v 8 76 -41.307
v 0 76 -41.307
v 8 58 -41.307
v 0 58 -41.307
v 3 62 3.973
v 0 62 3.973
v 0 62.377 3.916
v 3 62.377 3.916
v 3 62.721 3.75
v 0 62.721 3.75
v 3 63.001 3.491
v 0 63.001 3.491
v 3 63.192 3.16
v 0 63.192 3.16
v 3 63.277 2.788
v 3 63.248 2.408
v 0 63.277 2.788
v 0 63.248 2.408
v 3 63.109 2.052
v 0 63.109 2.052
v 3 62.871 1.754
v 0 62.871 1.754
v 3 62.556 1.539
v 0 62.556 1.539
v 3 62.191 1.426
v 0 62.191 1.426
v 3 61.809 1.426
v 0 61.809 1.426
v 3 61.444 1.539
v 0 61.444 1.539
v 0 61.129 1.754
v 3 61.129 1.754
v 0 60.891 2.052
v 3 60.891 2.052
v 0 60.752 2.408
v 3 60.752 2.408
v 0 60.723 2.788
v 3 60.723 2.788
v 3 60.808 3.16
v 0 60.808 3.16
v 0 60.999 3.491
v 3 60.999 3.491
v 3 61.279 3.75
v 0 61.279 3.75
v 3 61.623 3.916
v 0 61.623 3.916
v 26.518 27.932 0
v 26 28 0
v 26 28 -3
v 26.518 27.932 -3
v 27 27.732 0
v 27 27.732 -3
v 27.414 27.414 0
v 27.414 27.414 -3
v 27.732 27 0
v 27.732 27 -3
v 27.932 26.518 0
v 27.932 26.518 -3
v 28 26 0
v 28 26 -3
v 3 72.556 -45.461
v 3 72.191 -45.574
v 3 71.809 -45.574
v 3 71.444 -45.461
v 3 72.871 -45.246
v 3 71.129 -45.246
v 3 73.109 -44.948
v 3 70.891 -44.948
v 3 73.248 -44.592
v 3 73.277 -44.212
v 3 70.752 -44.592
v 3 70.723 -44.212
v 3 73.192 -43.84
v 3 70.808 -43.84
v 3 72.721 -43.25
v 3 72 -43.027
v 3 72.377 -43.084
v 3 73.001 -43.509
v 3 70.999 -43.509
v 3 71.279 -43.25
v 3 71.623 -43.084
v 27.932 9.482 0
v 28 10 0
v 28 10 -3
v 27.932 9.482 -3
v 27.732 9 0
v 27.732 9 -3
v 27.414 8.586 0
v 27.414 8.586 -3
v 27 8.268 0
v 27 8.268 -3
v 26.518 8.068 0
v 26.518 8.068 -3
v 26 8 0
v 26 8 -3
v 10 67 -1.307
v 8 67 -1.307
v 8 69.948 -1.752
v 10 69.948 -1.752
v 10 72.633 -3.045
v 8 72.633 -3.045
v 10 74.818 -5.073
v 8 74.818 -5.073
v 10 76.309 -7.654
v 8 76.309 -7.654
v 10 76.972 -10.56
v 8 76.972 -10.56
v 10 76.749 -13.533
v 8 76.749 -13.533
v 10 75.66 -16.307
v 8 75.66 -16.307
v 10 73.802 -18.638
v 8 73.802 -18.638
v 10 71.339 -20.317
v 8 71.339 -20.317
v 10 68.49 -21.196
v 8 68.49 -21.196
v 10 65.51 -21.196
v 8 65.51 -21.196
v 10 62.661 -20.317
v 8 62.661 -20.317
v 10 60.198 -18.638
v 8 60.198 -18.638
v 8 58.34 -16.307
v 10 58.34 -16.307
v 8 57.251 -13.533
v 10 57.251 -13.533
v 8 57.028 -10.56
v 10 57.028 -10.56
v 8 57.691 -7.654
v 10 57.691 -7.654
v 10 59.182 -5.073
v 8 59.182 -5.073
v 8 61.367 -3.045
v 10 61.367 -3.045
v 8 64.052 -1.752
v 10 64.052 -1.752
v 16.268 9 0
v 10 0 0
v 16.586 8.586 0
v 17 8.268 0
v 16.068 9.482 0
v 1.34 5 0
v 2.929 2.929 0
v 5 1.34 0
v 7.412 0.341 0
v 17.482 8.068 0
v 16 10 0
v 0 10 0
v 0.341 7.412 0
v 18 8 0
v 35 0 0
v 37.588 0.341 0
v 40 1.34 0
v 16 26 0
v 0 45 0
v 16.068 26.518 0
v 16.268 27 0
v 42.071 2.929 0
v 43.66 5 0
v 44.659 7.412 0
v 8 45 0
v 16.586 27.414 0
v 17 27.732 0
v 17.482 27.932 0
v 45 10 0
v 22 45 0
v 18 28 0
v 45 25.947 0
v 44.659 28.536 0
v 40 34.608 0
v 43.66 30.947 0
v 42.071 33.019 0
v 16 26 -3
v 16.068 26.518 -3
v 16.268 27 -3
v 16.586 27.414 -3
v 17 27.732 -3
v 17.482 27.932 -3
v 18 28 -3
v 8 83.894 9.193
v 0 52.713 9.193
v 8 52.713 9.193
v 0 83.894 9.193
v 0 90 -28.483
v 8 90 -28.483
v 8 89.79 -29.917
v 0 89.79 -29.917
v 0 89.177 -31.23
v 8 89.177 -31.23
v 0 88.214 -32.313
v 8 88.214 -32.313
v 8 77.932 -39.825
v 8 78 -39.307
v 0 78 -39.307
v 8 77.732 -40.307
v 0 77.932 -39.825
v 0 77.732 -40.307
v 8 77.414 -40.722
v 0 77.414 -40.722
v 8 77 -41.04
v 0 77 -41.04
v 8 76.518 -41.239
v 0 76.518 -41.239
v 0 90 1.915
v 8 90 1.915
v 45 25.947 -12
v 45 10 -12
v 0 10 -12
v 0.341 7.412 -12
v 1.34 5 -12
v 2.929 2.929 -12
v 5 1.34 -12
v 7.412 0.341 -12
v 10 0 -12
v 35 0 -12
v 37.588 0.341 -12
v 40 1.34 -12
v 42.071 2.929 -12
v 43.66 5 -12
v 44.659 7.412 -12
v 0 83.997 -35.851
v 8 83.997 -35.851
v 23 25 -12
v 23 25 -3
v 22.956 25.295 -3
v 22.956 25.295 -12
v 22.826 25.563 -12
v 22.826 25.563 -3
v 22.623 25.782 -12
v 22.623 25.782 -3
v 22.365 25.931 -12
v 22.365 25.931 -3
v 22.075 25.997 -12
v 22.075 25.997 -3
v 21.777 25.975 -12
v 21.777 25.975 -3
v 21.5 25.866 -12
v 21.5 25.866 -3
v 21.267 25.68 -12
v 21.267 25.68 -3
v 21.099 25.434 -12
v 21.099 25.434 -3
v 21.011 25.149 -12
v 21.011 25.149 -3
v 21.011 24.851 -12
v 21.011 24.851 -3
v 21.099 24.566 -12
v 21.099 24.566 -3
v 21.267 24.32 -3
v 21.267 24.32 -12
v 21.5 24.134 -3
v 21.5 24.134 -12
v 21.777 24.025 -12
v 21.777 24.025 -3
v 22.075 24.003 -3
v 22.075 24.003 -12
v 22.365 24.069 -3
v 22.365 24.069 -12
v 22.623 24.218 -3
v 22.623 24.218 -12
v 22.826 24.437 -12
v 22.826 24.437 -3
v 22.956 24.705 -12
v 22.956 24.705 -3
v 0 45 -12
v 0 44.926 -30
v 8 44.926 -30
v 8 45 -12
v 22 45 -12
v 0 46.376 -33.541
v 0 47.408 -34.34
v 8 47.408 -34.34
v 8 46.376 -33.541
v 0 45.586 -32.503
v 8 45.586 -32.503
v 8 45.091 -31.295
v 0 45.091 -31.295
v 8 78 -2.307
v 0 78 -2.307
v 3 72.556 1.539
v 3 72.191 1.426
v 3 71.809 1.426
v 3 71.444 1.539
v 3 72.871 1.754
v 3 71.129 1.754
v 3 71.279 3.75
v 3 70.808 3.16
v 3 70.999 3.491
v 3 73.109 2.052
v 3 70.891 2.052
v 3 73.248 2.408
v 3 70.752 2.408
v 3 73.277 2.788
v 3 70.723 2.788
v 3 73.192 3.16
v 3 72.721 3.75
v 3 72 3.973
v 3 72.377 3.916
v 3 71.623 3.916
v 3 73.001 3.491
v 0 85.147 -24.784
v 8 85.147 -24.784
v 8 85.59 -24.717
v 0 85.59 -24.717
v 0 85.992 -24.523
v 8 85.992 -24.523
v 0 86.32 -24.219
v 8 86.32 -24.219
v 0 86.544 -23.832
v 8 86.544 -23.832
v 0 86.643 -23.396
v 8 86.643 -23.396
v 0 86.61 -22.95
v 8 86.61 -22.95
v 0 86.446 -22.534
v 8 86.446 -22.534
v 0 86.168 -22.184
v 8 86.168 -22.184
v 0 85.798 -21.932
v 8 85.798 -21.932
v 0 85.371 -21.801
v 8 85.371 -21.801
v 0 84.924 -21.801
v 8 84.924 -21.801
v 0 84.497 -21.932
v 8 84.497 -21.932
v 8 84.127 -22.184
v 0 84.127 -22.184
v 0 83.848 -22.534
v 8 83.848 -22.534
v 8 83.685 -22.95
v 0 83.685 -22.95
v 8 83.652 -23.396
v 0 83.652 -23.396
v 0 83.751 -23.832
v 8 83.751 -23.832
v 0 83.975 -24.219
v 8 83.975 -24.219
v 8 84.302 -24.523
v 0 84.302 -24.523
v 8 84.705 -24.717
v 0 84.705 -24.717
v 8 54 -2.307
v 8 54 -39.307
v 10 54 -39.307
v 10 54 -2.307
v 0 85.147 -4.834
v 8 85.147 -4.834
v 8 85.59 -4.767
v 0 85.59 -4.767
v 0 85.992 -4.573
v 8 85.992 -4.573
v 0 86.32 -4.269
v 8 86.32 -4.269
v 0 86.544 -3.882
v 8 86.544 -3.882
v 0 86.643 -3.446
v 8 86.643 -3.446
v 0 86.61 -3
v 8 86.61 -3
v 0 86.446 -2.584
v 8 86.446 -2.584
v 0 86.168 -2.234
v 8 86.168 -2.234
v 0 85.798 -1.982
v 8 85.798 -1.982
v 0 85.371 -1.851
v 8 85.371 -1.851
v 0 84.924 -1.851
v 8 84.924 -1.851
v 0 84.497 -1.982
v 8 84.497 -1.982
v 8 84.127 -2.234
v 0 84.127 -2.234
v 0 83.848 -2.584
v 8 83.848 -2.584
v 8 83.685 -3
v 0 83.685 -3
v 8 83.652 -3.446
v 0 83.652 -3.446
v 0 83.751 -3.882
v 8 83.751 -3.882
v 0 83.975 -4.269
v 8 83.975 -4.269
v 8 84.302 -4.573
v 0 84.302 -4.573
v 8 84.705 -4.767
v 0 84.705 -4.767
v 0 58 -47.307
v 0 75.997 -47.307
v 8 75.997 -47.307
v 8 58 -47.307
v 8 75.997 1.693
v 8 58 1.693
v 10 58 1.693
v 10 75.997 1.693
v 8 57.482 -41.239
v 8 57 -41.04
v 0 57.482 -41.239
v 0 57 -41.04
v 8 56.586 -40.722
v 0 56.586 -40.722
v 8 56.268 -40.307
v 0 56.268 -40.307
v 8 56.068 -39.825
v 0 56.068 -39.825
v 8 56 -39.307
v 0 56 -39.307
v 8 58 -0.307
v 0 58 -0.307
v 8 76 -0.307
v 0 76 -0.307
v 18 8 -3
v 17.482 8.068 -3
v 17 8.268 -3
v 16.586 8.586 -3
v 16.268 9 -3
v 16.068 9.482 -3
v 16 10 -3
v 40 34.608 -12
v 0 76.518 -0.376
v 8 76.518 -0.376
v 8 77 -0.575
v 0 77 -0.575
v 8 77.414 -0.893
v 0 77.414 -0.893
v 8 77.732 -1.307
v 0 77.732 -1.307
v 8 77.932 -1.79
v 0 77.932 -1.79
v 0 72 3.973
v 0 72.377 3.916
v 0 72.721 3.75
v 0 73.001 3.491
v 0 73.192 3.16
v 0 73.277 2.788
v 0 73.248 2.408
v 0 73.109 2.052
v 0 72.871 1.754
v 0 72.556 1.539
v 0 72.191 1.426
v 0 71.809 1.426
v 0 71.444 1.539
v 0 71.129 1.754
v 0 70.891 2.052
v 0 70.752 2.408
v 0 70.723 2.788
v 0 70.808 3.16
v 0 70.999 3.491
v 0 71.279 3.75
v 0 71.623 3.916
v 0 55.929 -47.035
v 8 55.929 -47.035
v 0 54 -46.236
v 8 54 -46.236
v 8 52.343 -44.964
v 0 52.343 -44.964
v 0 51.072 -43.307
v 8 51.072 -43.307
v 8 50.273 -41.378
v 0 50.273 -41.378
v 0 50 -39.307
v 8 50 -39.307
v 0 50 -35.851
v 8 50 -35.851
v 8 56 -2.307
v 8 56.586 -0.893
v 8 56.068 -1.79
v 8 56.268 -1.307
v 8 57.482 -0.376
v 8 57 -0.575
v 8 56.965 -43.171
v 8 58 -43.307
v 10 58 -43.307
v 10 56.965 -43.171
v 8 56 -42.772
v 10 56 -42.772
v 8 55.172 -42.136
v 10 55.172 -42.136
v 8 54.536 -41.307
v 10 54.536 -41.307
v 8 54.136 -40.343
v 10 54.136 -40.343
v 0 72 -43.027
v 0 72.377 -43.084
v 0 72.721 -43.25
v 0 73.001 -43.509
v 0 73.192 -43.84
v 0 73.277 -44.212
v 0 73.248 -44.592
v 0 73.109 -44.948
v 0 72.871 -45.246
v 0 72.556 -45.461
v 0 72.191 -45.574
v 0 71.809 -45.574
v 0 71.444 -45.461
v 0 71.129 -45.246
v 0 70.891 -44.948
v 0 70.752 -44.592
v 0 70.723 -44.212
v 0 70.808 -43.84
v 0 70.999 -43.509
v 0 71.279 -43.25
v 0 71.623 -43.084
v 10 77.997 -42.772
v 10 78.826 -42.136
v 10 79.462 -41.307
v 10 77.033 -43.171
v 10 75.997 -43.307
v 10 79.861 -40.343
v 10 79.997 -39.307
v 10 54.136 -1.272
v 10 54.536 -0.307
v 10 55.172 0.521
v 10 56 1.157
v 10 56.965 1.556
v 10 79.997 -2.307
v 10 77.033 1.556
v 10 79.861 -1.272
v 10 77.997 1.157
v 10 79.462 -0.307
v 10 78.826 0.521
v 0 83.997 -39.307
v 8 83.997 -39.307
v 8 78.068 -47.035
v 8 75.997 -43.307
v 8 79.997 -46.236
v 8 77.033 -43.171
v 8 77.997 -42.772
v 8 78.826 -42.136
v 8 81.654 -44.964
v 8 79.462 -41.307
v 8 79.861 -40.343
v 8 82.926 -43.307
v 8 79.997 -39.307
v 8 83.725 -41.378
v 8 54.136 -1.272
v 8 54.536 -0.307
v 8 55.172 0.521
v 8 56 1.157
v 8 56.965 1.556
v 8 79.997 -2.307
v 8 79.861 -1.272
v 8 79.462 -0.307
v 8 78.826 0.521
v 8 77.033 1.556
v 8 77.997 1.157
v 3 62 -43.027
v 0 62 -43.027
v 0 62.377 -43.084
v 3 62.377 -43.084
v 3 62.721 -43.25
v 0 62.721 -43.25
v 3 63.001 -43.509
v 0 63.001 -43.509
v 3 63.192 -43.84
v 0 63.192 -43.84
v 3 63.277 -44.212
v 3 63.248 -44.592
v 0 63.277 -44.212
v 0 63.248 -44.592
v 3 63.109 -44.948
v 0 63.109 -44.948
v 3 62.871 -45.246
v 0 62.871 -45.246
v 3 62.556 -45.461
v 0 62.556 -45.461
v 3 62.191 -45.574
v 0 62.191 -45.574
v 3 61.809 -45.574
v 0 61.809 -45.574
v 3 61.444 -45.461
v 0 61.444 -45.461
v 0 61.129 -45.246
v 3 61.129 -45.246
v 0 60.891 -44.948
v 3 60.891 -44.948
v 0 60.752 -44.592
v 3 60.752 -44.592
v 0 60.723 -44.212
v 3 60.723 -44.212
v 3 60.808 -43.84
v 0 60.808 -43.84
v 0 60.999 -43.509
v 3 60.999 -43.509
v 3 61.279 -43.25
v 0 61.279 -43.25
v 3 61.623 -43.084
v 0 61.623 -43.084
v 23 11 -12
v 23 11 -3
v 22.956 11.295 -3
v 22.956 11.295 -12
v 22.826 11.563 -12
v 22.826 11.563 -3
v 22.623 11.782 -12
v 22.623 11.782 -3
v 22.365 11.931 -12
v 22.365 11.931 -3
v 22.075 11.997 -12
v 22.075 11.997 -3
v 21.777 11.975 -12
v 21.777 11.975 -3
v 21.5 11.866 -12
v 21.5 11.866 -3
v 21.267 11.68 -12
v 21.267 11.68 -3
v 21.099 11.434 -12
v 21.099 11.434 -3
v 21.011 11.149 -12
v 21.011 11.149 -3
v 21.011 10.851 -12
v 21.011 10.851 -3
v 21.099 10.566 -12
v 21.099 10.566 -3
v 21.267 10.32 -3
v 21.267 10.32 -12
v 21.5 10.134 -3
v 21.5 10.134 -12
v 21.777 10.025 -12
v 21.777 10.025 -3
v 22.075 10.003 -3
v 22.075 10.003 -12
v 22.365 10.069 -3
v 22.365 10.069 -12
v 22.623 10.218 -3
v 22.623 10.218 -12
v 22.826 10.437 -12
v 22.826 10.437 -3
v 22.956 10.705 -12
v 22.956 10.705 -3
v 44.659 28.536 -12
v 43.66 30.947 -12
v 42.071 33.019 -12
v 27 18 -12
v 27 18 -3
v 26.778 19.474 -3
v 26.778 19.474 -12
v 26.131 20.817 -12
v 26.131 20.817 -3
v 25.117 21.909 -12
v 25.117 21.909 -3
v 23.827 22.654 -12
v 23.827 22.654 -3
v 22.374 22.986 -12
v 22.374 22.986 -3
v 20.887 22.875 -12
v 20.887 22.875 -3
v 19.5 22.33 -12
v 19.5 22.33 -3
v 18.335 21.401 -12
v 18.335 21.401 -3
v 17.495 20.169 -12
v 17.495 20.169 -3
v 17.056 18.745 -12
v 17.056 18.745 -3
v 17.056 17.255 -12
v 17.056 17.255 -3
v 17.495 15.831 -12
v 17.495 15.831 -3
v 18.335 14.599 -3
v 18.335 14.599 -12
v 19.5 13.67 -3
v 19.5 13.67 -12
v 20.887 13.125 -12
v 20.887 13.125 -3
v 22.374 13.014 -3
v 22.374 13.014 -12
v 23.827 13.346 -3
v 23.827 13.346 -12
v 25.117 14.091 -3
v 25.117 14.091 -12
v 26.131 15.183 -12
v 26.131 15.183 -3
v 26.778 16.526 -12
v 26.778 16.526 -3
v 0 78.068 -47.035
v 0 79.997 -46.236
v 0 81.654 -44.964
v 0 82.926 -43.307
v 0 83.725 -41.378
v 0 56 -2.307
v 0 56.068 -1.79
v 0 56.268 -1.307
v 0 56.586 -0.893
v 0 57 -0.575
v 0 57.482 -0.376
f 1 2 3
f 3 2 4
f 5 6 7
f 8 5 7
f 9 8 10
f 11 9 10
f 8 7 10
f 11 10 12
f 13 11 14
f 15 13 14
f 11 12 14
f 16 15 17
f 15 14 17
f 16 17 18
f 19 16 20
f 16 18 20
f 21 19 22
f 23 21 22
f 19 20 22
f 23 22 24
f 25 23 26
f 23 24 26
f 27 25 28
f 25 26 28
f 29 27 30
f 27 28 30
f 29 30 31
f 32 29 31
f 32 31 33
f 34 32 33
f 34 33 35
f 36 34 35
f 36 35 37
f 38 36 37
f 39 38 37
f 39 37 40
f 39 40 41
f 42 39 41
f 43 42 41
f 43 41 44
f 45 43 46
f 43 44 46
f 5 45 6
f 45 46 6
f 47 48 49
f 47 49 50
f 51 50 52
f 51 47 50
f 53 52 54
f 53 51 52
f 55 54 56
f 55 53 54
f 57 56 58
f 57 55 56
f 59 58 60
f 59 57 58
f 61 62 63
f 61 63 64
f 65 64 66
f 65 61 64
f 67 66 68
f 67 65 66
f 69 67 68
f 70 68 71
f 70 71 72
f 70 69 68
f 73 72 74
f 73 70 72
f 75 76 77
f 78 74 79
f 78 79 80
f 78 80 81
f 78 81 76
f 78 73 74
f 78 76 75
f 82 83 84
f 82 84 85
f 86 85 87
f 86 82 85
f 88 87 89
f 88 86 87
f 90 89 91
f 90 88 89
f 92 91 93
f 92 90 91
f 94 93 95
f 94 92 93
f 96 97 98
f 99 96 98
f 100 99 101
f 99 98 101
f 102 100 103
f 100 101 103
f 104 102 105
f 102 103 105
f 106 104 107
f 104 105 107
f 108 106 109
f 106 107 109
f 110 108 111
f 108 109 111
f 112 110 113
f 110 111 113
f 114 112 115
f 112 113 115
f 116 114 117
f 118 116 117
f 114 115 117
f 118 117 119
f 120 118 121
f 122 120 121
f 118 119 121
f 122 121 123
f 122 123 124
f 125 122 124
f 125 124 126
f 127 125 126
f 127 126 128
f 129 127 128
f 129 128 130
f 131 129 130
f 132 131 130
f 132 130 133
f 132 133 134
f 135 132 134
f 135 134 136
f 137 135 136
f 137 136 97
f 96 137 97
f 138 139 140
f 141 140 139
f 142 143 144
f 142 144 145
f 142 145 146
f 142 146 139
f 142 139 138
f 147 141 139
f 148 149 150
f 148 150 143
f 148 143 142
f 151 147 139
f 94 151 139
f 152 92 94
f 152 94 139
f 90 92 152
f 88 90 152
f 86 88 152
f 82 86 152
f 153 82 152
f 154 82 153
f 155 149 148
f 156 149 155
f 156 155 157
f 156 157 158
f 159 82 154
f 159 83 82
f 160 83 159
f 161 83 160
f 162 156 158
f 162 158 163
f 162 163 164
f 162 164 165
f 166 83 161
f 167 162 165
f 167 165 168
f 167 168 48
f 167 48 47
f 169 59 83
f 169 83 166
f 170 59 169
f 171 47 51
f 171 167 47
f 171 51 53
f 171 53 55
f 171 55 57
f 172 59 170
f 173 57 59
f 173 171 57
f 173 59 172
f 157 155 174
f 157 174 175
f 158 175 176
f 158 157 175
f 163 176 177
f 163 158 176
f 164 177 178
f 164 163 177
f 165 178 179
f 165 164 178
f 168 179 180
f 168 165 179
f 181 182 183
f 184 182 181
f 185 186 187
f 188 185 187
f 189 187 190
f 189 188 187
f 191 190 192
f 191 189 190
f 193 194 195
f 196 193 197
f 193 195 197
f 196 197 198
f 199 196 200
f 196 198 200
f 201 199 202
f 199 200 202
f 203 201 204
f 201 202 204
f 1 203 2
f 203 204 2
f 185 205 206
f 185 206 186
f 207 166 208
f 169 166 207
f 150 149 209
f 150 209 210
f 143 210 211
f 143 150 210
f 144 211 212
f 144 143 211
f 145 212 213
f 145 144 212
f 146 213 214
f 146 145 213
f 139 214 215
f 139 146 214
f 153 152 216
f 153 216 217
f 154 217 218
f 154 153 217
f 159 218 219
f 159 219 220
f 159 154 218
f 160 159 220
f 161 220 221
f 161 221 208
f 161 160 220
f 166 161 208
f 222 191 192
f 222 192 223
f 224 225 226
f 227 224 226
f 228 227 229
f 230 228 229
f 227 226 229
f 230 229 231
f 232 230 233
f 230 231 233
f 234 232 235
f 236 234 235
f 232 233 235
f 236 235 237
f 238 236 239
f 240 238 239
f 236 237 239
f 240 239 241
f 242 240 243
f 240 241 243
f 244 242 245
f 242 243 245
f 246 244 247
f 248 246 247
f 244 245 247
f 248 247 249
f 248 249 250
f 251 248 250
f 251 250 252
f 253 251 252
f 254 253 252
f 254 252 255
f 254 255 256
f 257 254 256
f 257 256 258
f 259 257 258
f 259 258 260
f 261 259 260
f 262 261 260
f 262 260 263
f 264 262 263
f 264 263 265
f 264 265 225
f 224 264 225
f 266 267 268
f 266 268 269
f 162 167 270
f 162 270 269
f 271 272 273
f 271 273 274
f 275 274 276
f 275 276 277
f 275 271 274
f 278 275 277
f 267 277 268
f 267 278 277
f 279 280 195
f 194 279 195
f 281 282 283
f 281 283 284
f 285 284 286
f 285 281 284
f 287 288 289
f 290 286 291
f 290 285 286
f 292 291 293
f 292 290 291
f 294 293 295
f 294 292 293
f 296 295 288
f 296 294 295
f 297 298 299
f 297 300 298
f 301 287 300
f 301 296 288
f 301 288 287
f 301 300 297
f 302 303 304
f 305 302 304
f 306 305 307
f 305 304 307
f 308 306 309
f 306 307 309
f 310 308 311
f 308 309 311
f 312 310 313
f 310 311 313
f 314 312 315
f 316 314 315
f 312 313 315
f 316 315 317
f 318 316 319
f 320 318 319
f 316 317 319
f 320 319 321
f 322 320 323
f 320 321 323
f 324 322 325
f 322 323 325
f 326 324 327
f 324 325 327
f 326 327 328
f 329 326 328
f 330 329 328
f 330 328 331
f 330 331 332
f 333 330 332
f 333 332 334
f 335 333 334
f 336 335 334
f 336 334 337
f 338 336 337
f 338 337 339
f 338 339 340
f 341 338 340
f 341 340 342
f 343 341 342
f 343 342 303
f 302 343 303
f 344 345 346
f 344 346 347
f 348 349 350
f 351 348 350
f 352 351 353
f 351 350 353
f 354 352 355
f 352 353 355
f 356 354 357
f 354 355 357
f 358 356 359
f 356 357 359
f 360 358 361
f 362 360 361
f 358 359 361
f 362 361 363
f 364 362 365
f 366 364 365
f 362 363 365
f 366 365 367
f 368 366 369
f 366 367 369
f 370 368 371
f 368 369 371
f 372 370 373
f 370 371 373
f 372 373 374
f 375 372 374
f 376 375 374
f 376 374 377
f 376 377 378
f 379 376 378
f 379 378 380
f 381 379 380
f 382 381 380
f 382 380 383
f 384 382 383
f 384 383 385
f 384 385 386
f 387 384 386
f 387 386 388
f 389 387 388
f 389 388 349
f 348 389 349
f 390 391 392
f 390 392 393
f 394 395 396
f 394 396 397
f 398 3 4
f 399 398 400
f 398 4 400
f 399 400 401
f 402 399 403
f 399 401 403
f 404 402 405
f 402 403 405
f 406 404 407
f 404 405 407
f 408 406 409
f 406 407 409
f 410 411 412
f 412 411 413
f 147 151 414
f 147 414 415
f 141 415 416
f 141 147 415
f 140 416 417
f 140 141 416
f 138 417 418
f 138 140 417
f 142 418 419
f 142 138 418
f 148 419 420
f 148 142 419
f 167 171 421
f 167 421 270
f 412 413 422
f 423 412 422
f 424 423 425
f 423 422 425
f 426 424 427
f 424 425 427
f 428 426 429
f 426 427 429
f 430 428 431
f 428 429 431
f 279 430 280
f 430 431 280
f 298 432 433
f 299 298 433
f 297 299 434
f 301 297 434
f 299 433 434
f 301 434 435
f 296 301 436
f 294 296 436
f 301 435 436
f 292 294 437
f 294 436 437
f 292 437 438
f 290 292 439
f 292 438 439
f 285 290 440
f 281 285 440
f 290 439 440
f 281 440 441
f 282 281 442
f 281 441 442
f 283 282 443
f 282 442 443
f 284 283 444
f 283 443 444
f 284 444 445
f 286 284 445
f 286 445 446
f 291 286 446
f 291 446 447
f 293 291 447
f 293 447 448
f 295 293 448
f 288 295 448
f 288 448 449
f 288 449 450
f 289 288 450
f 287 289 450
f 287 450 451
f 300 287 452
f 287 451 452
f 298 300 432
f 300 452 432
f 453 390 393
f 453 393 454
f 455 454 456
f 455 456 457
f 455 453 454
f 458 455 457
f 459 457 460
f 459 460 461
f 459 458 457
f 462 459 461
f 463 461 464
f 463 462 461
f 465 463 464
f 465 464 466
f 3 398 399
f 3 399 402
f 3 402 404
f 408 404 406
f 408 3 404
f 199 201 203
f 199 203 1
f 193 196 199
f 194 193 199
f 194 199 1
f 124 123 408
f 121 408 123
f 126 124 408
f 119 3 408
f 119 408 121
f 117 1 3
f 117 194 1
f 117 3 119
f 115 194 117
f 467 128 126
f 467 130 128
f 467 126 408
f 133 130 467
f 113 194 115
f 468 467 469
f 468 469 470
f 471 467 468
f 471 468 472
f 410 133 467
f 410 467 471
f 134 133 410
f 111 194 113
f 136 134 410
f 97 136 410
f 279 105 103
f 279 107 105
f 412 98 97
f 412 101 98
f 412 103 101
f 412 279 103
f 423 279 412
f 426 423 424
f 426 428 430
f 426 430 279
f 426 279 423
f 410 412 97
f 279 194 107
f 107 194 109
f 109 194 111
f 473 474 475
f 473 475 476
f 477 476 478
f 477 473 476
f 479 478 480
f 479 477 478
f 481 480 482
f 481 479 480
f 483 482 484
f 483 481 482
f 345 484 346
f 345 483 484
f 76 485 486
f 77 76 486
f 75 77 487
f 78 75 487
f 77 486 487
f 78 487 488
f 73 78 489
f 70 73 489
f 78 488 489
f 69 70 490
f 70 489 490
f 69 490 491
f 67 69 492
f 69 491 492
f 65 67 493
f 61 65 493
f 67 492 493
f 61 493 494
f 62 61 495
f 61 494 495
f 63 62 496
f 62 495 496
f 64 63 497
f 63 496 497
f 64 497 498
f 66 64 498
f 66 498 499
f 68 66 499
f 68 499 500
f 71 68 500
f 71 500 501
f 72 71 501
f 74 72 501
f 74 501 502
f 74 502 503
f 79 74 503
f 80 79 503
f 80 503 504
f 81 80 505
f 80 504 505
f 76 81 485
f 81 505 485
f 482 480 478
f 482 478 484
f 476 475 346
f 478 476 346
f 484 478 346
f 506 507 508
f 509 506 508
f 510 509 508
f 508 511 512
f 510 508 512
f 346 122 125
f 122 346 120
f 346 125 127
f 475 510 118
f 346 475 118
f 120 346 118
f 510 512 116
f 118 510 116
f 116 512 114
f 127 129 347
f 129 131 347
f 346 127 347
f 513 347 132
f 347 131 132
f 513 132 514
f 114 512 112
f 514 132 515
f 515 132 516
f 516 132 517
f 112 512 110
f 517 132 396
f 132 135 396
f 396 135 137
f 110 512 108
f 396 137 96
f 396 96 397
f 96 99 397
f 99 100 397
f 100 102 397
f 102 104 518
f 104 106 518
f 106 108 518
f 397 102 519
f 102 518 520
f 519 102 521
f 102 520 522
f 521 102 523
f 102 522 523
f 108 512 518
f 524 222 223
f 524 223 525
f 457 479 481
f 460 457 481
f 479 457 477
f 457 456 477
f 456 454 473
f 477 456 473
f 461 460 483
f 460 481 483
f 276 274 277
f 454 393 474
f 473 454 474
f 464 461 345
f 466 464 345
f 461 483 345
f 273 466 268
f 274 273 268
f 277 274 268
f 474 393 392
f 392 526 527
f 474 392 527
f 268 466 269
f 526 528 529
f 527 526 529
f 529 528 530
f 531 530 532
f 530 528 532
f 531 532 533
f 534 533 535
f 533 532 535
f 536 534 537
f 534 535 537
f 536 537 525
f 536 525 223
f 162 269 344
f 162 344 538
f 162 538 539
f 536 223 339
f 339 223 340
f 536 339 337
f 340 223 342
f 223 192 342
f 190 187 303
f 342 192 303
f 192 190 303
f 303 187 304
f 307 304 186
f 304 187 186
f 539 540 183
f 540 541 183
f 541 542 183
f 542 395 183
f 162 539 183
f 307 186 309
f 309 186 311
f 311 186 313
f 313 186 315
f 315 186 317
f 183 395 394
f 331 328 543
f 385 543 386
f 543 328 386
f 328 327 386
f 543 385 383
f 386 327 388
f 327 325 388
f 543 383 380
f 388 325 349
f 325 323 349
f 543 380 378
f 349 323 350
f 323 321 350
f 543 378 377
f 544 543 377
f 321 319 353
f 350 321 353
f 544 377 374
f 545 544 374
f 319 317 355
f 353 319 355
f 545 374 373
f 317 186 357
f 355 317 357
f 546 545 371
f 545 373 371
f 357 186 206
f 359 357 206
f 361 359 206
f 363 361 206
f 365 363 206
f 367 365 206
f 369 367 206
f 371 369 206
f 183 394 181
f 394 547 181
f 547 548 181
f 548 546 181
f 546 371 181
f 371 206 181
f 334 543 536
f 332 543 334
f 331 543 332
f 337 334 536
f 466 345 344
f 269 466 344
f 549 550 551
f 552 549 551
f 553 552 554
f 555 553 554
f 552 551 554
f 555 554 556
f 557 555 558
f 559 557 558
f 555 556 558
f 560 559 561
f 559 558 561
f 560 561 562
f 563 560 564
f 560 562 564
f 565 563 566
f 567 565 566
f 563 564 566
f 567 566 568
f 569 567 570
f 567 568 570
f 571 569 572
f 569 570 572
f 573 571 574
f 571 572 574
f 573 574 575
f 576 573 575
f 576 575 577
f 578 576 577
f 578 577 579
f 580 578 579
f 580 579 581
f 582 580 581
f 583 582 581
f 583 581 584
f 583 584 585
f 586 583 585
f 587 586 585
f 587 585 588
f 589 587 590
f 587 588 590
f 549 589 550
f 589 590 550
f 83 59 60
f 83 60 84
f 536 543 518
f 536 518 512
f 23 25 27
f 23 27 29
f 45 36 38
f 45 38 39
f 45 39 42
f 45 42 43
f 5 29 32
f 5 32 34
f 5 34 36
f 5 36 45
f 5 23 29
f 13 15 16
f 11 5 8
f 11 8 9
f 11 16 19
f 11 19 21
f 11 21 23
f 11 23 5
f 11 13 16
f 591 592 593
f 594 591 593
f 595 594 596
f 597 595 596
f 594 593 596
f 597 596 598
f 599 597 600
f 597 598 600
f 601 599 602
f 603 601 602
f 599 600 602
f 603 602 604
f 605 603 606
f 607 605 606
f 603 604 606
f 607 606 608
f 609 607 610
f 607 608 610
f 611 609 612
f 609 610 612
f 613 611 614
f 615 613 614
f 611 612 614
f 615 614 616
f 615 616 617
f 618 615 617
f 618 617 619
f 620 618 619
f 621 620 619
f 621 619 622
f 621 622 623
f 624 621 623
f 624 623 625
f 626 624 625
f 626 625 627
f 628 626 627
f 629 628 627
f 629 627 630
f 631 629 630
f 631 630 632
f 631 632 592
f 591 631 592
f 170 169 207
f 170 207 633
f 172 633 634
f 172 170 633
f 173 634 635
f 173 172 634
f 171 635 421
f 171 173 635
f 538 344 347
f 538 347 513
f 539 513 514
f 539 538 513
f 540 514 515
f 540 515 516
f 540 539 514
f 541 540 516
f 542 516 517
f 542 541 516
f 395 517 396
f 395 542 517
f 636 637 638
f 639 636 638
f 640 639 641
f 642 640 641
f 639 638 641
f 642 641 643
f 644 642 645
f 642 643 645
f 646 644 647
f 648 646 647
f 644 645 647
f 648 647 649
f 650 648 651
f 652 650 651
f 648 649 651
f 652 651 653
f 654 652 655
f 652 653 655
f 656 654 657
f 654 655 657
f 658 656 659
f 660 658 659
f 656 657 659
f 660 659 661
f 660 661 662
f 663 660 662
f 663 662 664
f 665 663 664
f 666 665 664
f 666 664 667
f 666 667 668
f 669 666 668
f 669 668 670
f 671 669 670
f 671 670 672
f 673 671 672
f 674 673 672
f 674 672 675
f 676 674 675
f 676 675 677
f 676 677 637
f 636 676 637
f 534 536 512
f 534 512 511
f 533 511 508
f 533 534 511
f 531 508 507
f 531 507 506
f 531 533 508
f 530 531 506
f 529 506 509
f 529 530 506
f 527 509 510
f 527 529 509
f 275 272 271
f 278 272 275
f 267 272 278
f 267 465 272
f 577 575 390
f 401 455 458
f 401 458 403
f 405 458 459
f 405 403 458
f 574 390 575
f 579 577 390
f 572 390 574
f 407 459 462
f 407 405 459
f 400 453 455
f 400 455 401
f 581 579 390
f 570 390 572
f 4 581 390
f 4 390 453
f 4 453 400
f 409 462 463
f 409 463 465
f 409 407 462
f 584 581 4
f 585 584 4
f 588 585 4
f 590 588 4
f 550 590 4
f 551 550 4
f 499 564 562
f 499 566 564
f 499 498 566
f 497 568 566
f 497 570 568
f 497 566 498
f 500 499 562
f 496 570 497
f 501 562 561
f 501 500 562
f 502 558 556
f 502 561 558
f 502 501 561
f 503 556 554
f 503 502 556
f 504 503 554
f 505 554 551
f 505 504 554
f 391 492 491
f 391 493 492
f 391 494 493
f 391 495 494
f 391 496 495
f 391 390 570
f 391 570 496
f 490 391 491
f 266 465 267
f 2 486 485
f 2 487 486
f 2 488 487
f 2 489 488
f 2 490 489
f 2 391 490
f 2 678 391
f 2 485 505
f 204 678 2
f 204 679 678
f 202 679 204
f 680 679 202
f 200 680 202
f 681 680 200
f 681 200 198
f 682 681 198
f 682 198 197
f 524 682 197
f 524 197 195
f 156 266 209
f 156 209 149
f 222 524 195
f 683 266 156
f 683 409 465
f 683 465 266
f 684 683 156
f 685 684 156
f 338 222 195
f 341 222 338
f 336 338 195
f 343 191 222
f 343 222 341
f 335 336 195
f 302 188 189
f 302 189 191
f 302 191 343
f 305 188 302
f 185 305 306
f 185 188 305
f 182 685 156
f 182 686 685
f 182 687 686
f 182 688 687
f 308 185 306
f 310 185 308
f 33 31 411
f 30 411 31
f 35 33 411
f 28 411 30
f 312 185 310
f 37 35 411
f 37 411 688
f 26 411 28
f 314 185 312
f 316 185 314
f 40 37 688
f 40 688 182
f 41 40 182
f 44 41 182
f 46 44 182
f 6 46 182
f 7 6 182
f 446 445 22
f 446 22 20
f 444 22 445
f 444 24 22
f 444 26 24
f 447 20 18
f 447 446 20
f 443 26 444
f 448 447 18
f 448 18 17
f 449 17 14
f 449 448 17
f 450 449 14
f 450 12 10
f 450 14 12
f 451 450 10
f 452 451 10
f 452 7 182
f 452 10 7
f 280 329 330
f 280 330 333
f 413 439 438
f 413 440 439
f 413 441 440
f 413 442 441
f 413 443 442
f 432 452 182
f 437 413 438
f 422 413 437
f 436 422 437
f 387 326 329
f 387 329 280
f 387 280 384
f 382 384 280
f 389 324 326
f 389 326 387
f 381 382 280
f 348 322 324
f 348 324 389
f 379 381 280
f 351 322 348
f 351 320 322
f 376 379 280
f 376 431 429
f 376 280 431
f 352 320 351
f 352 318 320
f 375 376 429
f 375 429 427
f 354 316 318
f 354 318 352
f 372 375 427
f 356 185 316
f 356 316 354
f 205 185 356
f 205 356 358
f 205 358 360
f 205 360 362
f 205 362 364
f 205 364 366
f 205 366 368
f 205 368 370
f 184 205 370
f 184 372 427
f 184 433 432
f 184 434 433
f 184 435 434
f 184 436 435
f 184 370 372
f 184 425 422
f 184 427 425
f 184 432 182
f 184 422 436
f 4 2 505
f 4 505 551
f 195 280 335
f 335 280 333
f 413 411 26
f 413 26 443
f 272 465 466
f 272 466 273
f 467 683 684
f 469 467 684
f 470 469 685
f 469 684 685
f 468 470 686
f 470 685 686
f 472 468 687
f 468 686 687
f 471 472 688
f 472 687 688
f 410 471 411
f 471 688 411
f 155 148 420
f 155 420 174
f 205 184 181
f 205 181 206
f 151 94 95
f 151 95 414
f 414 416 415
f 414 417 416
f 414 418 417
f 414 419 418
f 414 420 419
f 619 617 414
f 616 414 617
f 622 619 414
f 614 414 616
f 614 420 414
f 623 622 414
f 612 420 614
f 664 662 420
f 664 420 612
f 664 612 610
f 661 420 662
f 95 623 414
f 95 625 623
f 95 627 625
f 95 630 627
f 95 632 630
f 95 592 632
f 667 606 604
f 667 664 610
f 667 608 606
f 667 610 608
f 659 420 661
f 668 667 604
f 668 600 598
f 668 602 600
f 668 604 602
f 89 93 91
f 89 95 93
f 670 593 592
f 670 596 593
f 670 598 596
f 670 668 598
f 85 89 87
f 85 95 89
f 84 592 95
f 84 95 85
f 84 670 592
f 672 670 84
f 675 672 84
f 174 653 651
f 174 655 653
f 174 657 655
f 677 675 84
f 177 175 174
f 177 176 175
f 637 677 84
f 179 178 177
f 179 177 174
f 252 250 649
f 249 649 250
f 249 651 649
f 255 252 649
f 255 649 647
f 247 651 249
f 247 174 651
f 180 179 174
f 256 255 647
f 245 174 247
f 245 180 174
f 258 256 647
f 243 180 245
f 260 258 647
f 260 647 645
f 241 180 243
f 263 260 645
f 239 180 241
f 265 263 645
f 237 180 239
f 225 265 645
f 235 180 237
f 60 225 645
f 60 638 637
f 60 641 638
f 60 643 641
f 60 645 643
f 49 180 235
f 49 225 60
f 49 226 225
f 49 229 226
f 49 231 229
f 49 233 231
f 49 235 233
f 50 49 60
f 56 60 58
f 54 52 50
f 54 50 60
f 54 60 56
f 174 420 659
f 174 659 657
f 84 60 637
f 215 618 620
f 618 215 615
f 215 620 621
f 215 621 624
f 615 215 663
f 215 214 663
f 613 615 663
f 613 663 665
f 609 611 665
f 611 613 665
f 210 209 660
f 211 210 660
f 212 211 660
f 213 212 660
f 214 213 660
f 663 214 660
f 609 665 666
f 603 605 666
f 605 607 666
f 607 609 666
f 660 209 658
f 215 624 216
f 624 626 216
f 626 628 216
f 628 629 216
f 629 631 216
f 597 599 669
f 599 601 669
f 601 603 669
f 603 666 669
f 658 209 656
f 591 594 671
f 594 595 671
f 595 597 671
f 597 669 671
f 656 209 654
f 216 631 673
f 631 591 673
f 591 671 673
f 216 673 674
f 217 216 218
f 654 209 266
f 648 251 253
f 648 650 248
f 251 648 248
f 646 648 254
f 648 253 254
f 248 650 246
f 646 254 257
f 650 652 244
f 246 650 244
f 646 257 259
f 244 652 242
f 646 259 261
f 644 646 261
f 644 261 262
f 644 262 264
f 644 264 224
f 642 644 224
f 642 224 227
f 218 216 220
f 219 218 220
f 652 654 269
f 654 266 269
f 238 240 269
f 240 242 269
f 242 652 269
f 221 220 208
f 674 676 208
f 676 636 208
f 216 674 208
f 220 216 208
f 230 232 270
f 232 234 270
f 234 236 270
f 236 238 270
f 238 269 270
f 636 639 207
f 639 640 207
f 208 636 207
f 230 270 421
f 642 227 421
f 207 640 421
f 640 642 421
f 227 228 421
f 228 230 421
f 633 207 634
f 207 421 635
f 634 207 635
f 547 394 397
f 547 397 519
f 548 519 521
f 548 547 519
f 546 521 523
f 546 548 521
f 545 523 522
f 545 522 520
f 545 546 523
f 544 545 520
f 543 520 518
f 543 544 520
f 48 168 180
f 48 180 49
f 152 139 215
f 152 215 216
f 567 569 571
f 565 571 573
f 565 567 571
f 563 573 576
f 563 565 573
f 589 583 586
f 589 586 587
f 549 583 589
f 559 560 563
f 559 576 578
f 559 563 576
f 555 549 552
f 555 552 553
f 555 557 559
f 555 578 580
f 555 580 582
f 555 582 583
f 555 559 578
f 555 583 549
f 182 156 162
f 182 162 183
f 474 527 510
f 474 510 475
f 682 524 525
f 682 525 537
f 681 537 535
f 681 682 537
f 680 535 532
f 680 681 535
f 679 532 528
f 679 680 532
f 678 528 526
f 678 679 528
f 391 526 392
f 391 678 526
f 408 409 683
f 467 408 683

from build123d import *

# Parameters (mm, degrees)
BOSS_EXTRUDE1_DEPTH     = 12
SKETCH1_3_R             = 1
SKETCH1_3_R_2           = 5
CUT_EXTRUDE1_DEPTH      = 3
SKETCH1_4_R             = 1
SKETCH1_4_R_2           = 5
CUT_EXTRUDE2_DEPTH      = 13
BOSS_EXTRUDE2_DEPTH     = 8
BOSS_EXTRUDE3_DEPTH     = 10
CUT_EXTRUDE5_DEPTH      = 8
SKETCH3_7_R             = 10
CUT_EXTRUDE6_DEPTH      = 46
SKETCH7_R               = 1.280379455
CUT_EXTRUDE7_DEPTH      = 3
SKETCH9_R               = 1.5
CUT_EXTRUDE8_DEPTH      = 38
CUT_EXTRUDE8_DEPTH_BACK = 9


with BuildPart() as part:
    # Sketch1 → Boss-Extrude1 (new body)
    with BuildSketch(Plane.XY):
        with BuildLine():
            Line((0, 45), (0, 10))
            ThreePointArc((0, 10), (2.928932188, 2.928932188), (10, 0))
            Line((10, 0), (35, 0))
            ThreePointArc((35, 0), (42.071067812, 2.928932188), (45, 10))
            Line((45, 10), (45, 25.947441117))
            ThreePointArc((45, 25.947441117), (43.660254038, 30.947441117), (40, 34.607695155))
            Line((40, 34.607695155), (22, 45))
            Line((22, 45), (0, 45))
        make_face()
    extrude(amount=-BOSS_EXTRUDE1_DEPTH)

    # Sketch1<3> → Cut-Extrude1 (cut)
    with BuildSketch(Plane.XY):
        with Locations((22, 25)):
            Circle(SKETCH1_3_R)
        with BuildLine():
            ThreePointArc((16, 26), (16.585786438, 27.414213562), (18, 28))
            Line((18, 28), (26, 28))
            ThreePointArc((26, 28), (27.414213562, 27.414213562), (28, 26))
            Line((28, 26), (28, 10))
            ThreePointArc((28, 10), (27.414213562, 8.585786438), (26, 8))
            Line((26, 8), (18, 8))
            ThreePointArc((18, 8), (16.585786438, 8.585786438), (16, 10))
            Line((16, 10), (16, 26))
        make_face()
        with Locations((22, 25)):
            Circle(SKETCH1_3_R, mode=Mode.SUBTRACT)
        with Locations((22, 11)):
            Circle(SKETCH1_3_R, mode=Mode.SUBTRACT)
        with Locations((22, 11)):
            Circle(SKETCH1_3_R)
        with Locations((22, 18)):
            Circle(SKETCH1_3_R_2)
    extrude(amount=-CUT_EXTRUDE1_DEPTH, mode=Mode.SUBTRACT)

    # Sketch1<4> → Cut-Extrude2 (cut, through all)
    with BuildSketch(Plane.XY):
        with Locations((22, 25)):
            Circle(SKETCH1_4_R)
        with Locations((22, 11)):
            Circle(SKETCH1_4_R)
        with Locations((22, 18)):
            Circle(SKETCH1_4_R_2)
    extrude(amount=-CUT_EXTRUDE2_DEPTH, mode=Mode.SUBTRACT)

    # Sketch3 → Boss-Extrude2 (add)
    with BuildSketch(Plane.ZY):
        with BuildLine():
            Line((0, 45), (9.192533317, 52.713451316))
            Line((9.192533317, 52.713451316), (9.192533317, 83.893517708))
            Line((9.192533317, 83.893517708), (1.915111108, 90))
            Line((1.915111108, 90), (-28.48263132, 90))
            ThreePointArc((-28.48263132, 90), (-30.595722628, 89.531538935), (-32.312853535, 88.213938048))
            Line((-32.312853535, 88.213938048), (-35.850897987, 83.997460862))
            Line((-35.850897987, 83.997460862), (-39.307466683, 83.997460862))
            ThreePointArc((-39.307466683, 83.997460862), (-44.964320932, 81.654315111), (-47.307466683, 75.997460862))
            Line((-47.307466683, 75.997460862), (-47.307466683, 58))
            ThreePointArc((-47.307466683, 58), (-44.964320932, 52.343145751), (-39.307466683, 50))
            Line((-39.307466683, 50), (-35.850897987, 50))
            Line((-35.850897987, 50), (-34.340222638, 47.408116517))
            ThreePointArc((-34.340222638, 47.408116517), (-32.502582275, 45.585533814), (-29.999847687, 44.925951074))
            Line((-29.999847687, 44.925951074), (-12, 45))
            Line((-12, 45), (0, 45))
        make_face()
        with BuildLine():
            ThreePointArc((-0.307466683, 58), (-0.89325312, 56.585786438), (-2.307466683, 56))
            Line((-2.307466683, 56), (-39.307466683, 56))
            ThreePointArc((-39.307466683, 56), (-40.721680245, 56.585786438), (-41.307466683, 58))
            Line((-41.307466683, 58), (-41.307466683, 76))
            ThreePointArc((-41.307466683, 76), (-40.721680245, 77.414213562), (-39.307466683, 78))
            Line((-39.307466683, 78), (-2.307466683, 78))
            ThreePointArc((-2.307466683, 78), (-0.89325312, 77.414213562), (-0.307466683, 76))
            Line((-0.307466683, 76), (-0.307466683, 58))
        make_face(mode=Mode.SUBTRACT)
    extrude(amount=-BOSS_EXTRUDE2_DEPTH)

    # Sketch3<4> → Boss-Extrude3 (add)
    with BuildSketch(Plane.ZY):
        with BuildLine():
            Line((-43.307466683, 75.997460862), (-43.307466683, 58))
            ThreePointArc((-43.307466683, 58), (-42.135893807, 55.171572875), (-39.307466683, 54))
            Line((-39.307466683, 54), (-2.307466683, 54))
            ThreePointArc((-2.307466683, 54), (0.520960442, 55.171572875), (1.692533317, 58))
            Line((1.692533317, 58), (1.692533317, 75.997460862))
            ThreePointArc((1.692533317, 75.997460862), (0.520960442, 78.825887987), (-2.307466683, 79.997460862))
            Line((-2.307466683, 79.997460862), (-39.307466683, 79.997460862))
            ThreePointArc((-39.307466683, 79.997460862), (-42.135893807, 78.825887987), (-43.307466683, 75.997460862))
        make_face()
    extrude(amount=-BOSS_EXTRUDE3_DEPTH)

    # Sketch3<6> → Cut-Extrude5 (cut)
    with BuildSketch(Plane.ZY):
        with BuildLine():
            Line((-41.307466683, 76), (-41.307466683, 58))
            ThreePointArc((-41.307466683, 58), (-40.721680245, 56.585786438), (-39.307466683, 56))
            Line((-39.307466683, 56), (-2.307466683, 56))
            ThreePointArc((-2.307466683, 56), (-0.89325312, 56.585786438), (-0.307466683, 58))
            Line((-0.307466683, 58), (-0.307466683, 76))
            ThreePointArc((-0.307466683, 76), (-0.89325312, 77.414213562), (-2.307466683, 78))
            Line((-2.307466683, 78), (-39.307466683, 78))
            ThreePointArc((-39.307466683, 78), (-40.721680245, 77.414213562), (-41.307466683, 76))
        make_face()
    extrude(amount=-CUT_EXTRUDE5_DEPTH, mode=Mode.SUBTRACT)

    # Sketch3<7> → Cut-Extrude6 (cut, through all)
    with BuildSketch(Plane.ZY):
        with Locations((-11.307466683, 67)):
            Circle(SKETCH3_7_R)
    extrude(amount=-CUT_EXTRUDE6_DEPTH, mode=Mode.SUBTRACT)

    # Sketch7 → Cut-Extrude7 (cut)
    with BuildSketch(Plane.ZY):
        with Locations((-44.307466683, 72)):
            Circle(SKETCH7_R)
        with Locations((-44.307466683, 62)):
            Circle(SKETCH7_R)
        with Locations((2.692533317, 62)):
            Circle(SKETCH7_R)
        with Locations((2.692533317, 72)):
            Circle(SKETCH7_R)
    extrude(amount=-CUT_EXTRUDE7_DEPTH, mode=Mode.SUBTRACT)

    # Sketch9 → Cut-Extrude8 (cut, two sides)
    with BuildSketch(Plane(origin=(8, 0, 0), x_dir=(0, 0, -1), z_dir=(1, 0, 0))) as cut_extrude8_sk:
        with Locations((3.333760106, 85.147460862)):
            Circle(SKETCH9_R)
        with Locations((23.283760106, 85.147460862)):
            Circle(SKETCH9_R)
    extrude(amount=CUT_EXTRUDE8_DEPTH, mode=Mode.SUBTRACT)
    extrude(cut_extrude8_sk.sketch, amount=-CUT_EXTRUDE8_DEPTH_BACK, mode=Mode.SUBTRACT)


solid = part.part
